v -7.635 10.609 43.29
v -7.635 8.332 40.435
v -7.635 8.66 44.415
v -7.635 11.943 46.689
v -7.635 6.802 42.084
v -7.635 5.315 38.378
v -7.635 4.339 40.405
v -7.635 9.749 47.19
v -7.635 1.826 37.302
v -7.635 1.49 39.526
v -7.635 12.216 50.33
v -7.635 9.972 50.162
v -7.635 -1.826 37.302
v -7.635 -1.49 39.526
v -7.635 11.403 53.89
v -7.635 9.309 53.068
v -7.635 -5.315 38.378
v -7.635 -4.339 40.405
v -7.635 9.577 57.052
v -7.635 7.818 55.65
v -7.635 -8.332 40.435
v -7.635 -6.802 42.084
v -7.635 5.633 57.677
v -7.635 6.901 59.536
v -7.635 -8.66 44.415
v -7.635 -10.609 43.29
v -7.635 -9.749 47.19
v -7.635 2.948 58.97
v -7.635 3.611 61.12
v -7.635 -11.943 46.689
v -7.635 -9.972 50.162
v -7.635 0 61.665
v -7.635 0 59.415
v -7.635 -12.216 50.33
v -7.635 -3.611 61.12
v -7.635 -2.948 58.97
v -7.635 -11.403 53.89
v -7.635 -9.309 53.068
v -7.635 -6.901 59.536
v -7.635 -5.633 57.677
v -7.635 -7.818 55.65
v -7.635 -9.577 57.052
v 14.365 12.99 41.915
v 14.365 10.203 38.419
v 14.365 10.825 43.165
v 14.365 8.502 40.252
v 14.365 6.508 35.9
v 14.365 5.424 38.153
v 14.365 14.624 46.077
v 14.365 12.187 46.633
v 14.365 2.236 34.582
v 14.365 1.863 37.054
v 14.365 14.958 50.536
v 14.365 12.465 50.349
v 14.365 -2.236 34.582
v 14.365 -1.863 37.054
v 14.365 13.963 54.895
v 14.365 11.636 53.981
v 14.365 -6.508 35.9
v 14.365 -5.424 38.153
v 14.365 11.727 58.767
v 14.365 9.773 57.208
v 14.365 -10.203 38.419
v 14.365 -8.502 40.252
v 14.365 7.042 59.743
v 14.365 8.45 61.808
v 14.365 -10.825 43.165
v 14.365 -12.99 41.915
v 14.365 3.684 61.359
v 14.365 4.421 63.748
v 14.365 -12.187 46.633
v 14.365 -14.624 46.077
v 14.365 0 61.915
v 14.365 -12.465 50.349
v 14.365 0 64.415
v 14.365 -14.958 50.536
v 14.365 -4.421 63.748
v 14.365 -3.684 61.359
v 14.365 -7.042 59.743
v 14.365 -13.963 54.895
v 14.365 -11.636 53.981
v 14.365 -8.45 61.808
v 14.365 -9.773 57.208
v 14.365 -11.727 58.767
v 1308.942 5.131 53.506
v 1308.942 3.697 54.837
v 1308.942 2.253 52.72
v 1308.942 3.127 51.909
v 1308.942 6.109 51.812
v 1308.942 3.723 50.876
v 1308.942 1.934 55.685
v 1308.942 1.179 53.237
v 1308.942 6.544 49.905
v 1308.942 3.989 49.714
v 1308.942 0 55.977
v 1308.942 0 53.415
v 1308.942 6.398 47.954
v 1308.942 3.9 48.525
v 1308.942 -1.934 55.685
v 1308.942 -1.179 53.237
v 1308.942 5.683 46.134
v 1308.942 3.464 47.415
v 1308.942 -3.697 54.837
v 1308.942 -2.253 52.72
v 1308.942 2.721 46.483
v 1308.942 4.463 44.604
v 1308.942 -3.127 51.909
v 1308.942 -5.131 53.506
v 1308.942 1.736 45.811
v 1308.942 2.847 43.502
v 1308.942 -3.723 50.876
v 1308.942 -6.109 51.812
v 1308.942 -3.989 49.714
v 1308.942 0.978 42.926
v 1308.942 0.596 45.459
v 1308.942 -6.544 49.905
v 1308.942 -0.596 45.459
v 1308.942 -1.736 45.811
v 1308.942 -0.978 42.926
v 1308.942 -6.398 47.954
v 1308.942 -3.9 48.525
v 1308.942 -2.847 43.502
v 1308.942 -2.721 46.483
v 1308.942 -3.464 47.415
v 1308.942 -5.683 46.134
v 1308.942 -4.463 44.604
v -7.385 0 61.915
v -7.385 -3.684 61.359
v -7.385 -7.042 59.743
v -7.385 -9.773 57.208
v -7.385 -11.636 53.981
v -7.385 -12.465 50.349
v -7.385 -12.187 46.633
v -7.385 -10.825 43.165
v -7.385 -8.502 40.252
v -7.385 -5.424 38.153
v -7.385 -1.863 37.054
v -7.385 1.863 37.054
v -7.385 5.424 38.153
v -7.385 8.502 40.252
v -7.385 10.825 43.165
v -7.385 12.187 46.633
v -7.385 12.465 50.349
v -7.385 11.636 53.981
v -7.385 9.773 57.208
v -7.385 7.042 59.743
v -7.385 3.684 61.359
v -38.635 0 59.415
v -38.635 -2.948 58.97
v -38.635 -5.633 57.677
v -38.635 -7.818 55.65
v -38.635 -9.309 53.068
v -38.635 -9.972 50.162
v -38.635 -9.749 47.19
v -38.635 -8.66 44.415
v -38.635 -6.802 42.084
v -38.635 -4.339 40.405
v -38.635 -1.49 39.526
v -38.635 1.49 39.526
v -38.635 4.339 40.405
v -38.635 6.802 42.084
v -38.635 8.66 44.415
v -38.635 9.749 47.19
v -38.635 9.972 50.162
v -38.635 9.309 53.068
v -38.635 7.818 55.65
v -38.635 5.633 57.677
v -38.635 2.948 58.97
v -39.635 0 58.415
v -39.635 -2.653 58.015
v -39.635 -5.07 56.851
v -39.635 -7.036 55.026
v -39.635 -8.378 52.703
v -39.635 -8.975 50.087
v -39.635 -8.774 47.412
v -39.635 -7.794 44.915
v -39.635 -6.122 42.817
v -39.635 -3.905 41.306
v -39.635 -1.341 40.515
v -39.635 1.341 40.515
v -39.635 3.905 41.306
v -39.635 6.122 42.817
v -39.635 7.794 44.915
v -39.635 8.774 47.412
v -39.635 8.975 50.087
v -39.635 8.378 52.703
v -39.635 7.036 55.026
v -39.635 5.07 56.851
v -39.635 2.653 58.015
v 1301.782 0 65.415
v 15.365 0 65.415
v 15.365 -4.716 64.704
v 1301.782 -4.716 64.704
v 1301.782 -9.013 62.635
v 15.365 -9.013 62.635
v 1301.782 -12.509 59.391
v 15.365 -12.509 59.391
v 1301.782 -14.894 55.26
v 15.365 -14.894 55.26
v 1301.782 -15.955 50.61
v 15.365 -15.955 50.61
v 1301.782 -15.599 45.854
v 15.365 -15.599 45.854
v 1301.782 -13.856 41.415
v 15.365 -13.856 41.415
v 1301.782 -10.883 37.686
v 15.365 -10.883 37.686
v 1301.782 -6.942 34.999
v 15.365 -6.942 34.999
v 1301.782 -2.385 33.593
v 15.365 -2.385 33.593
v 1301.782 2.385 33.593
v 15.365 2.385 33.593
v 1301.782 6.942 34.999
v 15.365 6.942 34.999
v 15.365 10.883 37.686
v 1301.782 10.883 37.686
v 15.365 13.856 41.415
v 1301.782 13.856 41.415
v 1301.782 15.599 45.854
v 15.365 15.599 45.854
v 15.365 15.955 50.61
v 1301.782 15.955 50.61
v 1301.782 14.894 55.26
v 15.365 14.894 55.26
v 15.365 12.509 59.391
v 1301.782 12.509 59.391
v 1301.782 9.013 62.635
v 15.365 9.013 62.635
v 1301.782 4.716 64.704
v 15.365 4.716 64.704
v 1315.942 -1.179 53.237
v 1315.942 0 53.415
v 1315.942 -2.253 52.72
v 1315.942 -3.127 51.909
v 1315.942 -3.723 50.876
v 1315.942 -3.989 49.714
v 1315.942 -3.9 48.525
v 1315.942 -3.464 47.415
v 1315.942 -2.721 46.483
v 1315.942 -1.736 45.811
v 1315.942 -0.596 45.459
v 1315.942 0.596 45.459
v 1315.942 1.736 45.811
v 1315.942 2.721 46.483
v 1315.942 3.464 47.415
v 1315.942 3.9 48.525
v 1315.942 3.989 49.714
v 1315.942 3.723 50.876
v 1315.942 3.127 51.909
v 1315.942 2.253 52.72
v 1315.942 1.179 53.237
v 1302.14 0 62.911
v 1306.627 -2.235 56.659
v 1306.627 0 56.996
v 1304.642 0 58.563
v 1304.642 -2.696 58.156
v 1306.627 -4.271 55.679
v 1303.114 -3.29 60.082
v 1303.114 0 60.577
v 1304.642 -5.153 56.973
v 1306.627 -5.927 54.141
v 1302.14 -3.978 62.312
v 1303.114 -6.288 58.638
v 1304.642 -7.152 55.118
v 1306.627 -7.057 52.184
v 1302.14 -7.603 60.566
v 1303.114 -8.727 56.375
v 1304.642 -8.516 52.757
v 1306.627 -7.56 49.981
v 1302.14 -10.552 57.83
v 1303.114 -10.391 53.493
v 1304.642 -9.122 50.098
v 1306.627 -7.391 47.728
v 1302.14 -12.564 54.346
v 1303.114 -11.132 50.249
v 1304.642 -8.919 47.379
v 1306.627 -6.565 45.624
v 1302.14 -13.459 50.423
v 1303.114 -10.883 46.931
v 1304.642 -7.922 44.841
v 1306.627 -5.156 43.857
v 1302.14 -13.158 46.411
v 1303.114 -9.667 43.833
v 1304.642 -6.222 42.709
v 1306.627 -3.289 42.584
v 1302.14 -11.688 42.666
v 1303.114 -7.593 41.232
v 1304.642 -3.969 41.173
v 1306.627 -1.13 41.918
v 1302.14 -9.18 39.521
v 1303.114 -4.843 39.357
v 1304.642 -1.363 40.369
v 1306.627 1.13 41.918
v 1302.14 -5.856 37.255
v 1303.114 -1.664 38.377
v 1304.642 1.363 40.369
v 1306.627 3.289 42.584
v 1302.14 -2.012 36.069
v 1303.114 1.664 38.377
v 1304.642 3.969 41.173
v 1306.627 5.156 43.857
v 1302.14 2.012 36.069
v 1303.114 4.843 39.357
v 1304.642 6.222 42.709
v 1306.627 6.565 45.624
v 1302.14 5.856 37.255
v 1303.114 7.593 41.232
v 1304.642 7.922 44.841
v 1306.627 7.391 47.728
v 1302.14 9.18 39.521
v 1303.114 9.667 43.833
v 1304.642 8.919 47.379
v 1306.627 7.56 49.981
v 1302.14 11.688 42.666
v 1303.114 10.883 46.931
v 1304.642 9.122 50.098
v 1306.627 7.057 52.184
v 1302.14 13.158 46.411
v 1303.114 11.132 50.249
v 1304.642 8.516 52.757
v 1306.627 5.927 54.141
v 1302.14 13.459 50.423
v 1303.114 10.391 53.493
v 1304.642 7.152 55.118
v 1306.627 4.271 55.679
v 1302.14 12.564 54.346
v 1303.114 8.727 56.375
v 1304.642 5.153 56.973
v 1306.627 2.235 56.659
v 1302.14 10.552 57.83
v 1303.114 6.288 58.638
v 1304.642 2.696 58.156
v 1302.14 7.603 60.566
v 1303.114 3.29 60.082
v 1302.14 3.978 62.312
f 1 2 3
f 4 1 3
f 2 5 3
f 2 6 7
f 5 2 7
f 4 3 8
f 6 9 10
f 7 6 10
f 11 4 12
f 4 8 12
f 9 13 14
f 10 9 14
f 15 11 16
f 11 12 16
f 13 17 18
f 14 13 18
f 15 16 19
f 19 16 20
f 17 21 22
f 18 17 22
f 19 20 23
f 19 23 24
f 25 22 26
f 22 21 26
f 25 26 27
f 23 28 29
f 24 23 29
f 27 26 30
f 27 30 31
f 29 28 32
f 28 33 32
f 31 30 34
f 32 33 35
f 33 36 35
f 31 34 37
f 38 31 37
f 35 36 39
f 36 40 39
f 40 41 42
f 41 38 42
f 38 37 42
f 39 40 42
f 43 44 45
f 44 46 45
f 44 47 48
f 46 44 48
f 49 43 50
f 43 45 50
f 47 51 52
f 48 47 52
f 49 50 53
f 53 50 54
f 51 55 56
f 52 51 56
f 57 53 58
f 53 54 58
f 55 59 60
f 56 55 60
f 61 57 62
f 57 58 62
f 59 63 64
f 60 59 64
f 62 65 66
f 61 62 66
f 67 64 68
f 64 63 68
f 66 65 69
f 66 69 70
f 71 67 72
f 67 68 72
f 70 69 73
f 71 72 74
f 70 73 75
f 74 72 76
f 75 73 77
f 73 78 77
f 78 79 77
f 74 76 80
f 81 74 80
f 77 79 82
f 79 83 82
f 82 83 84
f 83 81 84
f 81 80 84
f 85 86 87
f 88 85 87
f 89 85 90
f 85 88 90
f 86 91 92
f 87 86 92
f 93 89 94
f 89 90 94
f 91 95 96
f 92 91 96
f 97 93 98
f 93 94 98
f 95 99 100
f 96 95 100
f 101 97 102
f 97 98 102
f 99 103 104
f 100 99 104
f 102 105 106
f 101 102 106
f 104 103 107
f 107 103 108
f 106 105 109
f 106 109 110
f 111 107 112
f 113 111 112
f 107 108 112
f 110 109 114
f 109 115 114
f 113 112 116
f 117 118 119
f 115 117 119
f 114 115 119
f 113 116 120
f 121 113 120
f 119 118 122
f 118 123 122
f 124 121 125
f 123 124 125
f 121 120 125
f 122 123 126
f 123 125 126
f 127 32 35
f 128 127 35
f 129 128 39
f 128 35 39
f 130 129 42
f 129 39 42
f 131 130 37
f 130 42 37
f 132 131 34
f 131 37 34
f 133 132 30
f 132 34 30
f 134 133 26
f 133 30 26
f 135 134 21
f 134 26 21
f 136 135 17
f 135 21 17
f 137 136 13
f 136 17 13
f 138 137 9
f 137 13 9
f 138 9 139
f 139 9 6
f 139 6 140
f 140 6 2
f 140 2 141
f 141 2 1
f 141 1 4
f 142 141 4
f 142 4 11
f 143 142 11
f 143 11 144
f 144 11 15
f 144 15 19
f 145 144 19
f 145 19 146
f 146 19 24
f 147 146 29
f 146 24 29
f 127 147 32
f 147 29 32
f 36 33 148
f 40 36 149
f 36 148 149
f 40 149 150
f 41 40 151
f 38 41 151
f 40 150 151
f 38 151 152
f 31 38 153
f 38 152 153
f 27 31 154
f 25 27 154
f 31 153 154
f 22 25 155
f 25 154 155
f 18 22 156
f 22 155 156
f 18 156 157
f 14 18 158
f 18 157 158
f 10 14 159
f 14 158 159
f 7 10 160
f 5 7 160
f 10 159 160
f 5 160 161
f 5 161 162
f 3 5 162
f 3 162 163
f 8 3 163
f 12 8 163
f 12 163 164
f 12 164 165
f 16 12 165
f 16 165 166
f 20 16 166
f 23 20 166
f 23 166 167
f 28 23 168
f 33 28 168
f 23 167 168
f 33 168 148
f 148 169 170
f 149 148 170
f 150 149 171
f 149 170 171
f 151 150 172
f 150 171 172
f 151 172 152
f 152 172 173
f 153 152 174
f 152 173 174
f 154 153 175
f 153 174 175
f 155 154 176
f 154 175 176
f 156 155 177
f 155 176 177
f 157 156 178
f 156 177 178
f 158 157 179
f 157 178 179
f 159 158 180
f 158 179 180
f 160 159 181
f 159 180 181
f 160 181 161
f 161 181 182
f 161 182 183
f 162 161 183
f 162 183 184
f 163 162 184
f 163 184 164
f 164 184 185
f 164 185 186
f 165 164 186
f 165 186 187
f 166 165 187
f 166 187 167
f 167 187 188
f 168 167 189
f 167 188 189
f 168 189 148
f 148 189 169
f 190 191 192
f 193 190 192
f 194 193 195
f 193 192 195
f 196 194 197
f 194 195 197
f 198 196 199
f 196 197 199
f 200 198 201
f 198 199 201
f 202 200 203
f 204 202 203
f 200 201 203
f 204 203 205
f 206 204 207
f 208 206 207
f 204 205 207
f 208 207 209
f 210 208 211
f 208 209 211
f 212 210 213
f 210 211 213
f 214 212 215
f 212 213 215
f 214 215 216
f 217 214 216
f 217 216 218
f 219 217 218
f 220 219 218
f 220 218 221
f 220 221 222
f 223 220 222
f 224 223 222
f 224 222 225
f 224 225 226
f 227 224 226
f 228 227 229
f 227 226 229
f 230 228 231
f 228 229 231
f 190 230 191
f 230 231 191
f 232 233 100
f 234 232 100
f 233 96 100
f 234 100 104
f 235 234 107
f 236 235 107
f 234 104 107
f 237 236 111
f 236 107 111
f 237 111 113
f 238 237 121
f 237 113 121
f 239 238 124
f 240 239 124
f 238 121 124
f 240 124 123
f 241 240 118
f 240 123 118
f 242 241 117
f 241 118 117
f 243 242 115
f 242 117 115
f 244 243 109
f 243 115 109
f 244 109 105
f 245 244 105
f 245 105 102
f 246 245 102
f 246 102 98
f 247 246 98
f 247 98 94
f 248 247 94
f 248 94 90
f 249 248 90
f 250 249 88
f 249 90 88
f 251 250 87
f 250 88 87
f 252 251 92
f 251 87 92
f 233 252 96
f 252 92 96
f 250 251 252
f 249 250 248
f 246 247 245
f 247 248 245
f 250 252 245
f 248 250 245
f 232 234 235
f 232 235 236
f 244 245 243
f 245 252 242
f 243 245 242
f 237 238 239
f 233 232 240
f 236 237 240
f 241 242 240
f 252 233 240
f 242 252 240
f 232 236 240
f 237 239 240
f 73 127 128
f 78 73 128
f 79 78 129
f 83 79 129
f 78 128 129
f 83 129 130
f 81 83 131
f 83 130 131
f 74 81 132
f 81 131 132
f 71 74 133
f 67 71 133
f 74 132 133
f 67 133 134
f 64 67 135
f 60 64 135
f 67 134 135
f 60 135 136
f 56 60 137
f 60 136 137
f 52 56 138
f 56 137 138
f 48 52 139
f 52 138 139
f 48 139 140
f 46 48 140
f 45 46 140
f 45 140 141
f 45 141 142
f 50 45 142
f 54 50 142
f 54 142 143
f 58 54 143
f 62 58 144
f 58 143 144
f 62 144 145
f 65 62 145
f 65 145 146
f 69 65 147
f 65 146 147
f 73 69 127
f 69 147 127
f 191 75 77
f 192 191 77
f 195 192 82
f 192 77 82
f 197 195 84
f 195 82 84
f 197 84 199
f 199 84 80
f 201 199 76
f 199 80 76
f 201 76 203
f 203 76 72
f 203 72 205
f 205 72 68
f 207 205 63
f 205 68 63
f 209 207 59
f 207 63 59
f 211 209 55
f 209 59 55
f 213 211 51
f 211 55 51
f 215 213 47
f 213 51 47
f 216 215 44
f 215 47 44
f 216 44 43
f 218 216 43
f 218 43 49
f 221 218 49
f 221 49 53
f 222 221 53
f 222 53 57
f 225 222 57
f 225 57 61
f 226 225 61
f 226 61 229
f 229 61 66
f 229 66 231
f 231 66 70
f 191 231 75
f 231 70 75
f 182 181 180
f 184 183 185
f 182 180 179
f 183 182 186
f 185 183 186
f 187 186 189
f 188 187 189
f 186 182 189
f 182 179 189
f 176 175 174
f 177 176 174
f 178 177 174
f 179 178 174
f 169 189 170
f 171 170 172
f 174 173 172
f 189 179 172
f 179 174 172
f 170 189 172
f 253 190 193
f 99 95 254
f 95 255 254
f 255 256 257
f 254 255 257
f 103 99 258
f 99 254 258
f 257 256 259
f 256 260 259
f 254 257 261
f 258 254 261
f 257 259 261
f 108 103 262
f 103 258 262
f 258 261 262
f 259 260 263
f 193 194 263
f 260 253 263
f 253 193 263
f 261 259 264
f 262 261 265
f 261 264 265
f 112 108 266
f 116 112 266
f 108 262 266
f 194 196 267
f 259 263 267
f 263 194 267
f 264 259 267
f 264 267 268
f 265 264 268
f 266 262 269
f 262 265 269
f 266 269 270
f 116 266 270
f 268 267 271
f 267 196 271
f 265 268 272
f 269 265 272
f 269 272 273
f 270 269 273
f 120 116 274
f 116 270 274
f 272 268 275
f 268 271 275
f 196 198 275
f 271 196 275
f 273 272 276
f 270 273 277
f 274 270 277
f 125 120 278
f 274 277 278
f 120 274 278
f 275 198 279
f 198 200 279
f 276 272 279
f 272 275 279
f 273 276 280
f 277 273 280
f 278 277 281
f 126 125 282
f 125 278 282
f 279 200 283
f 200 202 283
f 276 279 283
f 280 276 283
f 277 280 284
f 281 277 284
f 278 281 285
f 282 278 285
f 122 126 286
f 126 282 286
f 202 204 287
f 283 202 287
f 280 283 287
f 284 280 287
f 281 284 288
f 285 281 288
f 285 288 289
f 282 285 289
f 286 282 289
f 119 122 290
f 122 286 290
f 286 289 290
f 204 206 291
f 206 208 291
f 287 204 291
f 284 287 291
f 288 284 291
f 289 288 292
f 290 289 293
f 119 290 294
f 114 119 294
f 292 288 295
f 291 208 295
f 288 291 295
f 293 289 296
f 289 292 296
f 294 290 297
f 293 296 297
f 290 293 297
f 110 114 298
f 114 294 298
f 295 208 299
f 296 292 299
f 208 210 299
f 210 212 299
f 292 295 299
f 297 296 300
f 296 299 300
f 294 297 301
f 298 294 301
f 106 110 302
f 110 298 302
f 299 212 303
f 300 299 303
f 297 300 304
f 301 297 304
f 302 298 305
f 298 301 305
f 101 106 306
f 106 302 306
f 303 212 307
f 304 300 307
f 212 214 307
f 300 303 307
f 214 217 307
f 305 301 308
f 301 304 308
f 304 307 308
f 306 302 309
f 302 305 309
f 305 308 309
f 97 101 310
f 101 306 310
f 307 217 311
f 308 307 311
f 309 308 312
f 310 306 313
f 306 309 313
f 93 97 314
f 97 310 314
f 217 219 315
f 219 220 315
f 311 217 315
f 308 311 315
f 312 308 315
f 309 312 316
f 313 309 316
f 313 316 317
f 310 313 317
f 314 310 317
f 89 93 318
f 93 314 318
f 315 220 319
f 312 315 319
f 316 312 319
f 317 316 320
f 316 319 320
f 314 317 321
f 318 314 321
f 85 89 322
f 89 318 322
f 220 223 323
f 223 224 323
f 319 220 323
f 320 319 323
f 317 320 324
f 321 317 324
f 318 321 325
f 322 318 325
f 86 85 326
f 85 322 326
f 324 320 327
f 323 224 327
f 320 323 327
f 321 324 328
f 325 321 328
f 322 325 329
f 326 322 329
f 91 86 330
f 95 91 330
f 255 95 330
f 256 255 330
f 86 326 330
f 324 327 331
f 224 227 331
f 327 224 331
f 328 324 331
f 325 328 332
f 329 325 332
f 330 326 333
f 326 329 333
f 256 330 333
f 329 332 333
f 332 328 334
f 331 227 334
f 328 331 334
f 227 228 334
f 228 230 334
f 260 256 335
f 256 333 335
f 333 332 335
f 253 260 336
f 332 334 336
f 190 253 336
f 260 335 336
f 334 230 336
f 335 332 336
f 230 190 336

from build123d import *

# Parameters (mm, degrees)
F2_SIZE = 1
F3_SIZE = 0.25
F4_SIZE = 1


with BuildPart() as f1:
    # F0 (on Front) → F1 (revolve)
    with BuildSketch(Plane.XZ):
        with BuildLine():
            Line((-39.6347922059, 59.4147157063), (-39.6347922059, 49.4147157063))
            Line((-39.6347922059, 49.4147157063), (1315.9418255951, 49.4147157063))
            Line((1315.9418255951, 49.4147157063), (1315.9418255951, 53.4147157063))
            Line((1315.9418255951, 53.4147157063), (1308.9418255951, 53.4147157063))
            Line((1308.9418255951, 53.4147157063), (1308.9418255951, 55.9769750426))
            ThreePointArc((1308.9418255951, 55.9769750426), (1303.814166428, 59.5216123442), (1301.782252331, 65.4147157063))
            Line((1301.782252331, 65.4147157063), (14.3652077941, 65.4147157063))
            Line((14.3652077941, 65.4147157063), (14.3652077941, 61.9147157063))
            Line((14.3652077941, 61.9147157063), (-7.6347922059, 61.9147157063))
            Line((-7.6347922059, 61.9147157063), (-7.6347922059, 59.4147157063))
            Line((-7.6347922059, 59.4147157063), (-39.6347922059, 59.4147157063))
        make_face()
    revolve(axis=Axis((638.1535166946, 0, 49.4147157063), (1, 0, 0)))

    # F2
    f2_edges = [f1.edges().sort_by_distance(p)[0] for p in [
        (14.365208, 0, 33.414716),
    ]]
    chamfer(f2_edges, length=F2_SIZE)

    # F3
    f3_edges = [f1.edges().sort_by_distance(p)[0] for p in [
        (-7.634792, 0, 36.914716),
    ]]
    chamfer(f3_edges, length=F3_SIZE)

    # F4
    f4_edges = [f1.edges().sort_by_distance(p)[0] for p in [
        (-39.634792, 0, 39.414716),
    ]]
    chamfer(f4_edges, length=F4_SIZE)


solid = f1.part
